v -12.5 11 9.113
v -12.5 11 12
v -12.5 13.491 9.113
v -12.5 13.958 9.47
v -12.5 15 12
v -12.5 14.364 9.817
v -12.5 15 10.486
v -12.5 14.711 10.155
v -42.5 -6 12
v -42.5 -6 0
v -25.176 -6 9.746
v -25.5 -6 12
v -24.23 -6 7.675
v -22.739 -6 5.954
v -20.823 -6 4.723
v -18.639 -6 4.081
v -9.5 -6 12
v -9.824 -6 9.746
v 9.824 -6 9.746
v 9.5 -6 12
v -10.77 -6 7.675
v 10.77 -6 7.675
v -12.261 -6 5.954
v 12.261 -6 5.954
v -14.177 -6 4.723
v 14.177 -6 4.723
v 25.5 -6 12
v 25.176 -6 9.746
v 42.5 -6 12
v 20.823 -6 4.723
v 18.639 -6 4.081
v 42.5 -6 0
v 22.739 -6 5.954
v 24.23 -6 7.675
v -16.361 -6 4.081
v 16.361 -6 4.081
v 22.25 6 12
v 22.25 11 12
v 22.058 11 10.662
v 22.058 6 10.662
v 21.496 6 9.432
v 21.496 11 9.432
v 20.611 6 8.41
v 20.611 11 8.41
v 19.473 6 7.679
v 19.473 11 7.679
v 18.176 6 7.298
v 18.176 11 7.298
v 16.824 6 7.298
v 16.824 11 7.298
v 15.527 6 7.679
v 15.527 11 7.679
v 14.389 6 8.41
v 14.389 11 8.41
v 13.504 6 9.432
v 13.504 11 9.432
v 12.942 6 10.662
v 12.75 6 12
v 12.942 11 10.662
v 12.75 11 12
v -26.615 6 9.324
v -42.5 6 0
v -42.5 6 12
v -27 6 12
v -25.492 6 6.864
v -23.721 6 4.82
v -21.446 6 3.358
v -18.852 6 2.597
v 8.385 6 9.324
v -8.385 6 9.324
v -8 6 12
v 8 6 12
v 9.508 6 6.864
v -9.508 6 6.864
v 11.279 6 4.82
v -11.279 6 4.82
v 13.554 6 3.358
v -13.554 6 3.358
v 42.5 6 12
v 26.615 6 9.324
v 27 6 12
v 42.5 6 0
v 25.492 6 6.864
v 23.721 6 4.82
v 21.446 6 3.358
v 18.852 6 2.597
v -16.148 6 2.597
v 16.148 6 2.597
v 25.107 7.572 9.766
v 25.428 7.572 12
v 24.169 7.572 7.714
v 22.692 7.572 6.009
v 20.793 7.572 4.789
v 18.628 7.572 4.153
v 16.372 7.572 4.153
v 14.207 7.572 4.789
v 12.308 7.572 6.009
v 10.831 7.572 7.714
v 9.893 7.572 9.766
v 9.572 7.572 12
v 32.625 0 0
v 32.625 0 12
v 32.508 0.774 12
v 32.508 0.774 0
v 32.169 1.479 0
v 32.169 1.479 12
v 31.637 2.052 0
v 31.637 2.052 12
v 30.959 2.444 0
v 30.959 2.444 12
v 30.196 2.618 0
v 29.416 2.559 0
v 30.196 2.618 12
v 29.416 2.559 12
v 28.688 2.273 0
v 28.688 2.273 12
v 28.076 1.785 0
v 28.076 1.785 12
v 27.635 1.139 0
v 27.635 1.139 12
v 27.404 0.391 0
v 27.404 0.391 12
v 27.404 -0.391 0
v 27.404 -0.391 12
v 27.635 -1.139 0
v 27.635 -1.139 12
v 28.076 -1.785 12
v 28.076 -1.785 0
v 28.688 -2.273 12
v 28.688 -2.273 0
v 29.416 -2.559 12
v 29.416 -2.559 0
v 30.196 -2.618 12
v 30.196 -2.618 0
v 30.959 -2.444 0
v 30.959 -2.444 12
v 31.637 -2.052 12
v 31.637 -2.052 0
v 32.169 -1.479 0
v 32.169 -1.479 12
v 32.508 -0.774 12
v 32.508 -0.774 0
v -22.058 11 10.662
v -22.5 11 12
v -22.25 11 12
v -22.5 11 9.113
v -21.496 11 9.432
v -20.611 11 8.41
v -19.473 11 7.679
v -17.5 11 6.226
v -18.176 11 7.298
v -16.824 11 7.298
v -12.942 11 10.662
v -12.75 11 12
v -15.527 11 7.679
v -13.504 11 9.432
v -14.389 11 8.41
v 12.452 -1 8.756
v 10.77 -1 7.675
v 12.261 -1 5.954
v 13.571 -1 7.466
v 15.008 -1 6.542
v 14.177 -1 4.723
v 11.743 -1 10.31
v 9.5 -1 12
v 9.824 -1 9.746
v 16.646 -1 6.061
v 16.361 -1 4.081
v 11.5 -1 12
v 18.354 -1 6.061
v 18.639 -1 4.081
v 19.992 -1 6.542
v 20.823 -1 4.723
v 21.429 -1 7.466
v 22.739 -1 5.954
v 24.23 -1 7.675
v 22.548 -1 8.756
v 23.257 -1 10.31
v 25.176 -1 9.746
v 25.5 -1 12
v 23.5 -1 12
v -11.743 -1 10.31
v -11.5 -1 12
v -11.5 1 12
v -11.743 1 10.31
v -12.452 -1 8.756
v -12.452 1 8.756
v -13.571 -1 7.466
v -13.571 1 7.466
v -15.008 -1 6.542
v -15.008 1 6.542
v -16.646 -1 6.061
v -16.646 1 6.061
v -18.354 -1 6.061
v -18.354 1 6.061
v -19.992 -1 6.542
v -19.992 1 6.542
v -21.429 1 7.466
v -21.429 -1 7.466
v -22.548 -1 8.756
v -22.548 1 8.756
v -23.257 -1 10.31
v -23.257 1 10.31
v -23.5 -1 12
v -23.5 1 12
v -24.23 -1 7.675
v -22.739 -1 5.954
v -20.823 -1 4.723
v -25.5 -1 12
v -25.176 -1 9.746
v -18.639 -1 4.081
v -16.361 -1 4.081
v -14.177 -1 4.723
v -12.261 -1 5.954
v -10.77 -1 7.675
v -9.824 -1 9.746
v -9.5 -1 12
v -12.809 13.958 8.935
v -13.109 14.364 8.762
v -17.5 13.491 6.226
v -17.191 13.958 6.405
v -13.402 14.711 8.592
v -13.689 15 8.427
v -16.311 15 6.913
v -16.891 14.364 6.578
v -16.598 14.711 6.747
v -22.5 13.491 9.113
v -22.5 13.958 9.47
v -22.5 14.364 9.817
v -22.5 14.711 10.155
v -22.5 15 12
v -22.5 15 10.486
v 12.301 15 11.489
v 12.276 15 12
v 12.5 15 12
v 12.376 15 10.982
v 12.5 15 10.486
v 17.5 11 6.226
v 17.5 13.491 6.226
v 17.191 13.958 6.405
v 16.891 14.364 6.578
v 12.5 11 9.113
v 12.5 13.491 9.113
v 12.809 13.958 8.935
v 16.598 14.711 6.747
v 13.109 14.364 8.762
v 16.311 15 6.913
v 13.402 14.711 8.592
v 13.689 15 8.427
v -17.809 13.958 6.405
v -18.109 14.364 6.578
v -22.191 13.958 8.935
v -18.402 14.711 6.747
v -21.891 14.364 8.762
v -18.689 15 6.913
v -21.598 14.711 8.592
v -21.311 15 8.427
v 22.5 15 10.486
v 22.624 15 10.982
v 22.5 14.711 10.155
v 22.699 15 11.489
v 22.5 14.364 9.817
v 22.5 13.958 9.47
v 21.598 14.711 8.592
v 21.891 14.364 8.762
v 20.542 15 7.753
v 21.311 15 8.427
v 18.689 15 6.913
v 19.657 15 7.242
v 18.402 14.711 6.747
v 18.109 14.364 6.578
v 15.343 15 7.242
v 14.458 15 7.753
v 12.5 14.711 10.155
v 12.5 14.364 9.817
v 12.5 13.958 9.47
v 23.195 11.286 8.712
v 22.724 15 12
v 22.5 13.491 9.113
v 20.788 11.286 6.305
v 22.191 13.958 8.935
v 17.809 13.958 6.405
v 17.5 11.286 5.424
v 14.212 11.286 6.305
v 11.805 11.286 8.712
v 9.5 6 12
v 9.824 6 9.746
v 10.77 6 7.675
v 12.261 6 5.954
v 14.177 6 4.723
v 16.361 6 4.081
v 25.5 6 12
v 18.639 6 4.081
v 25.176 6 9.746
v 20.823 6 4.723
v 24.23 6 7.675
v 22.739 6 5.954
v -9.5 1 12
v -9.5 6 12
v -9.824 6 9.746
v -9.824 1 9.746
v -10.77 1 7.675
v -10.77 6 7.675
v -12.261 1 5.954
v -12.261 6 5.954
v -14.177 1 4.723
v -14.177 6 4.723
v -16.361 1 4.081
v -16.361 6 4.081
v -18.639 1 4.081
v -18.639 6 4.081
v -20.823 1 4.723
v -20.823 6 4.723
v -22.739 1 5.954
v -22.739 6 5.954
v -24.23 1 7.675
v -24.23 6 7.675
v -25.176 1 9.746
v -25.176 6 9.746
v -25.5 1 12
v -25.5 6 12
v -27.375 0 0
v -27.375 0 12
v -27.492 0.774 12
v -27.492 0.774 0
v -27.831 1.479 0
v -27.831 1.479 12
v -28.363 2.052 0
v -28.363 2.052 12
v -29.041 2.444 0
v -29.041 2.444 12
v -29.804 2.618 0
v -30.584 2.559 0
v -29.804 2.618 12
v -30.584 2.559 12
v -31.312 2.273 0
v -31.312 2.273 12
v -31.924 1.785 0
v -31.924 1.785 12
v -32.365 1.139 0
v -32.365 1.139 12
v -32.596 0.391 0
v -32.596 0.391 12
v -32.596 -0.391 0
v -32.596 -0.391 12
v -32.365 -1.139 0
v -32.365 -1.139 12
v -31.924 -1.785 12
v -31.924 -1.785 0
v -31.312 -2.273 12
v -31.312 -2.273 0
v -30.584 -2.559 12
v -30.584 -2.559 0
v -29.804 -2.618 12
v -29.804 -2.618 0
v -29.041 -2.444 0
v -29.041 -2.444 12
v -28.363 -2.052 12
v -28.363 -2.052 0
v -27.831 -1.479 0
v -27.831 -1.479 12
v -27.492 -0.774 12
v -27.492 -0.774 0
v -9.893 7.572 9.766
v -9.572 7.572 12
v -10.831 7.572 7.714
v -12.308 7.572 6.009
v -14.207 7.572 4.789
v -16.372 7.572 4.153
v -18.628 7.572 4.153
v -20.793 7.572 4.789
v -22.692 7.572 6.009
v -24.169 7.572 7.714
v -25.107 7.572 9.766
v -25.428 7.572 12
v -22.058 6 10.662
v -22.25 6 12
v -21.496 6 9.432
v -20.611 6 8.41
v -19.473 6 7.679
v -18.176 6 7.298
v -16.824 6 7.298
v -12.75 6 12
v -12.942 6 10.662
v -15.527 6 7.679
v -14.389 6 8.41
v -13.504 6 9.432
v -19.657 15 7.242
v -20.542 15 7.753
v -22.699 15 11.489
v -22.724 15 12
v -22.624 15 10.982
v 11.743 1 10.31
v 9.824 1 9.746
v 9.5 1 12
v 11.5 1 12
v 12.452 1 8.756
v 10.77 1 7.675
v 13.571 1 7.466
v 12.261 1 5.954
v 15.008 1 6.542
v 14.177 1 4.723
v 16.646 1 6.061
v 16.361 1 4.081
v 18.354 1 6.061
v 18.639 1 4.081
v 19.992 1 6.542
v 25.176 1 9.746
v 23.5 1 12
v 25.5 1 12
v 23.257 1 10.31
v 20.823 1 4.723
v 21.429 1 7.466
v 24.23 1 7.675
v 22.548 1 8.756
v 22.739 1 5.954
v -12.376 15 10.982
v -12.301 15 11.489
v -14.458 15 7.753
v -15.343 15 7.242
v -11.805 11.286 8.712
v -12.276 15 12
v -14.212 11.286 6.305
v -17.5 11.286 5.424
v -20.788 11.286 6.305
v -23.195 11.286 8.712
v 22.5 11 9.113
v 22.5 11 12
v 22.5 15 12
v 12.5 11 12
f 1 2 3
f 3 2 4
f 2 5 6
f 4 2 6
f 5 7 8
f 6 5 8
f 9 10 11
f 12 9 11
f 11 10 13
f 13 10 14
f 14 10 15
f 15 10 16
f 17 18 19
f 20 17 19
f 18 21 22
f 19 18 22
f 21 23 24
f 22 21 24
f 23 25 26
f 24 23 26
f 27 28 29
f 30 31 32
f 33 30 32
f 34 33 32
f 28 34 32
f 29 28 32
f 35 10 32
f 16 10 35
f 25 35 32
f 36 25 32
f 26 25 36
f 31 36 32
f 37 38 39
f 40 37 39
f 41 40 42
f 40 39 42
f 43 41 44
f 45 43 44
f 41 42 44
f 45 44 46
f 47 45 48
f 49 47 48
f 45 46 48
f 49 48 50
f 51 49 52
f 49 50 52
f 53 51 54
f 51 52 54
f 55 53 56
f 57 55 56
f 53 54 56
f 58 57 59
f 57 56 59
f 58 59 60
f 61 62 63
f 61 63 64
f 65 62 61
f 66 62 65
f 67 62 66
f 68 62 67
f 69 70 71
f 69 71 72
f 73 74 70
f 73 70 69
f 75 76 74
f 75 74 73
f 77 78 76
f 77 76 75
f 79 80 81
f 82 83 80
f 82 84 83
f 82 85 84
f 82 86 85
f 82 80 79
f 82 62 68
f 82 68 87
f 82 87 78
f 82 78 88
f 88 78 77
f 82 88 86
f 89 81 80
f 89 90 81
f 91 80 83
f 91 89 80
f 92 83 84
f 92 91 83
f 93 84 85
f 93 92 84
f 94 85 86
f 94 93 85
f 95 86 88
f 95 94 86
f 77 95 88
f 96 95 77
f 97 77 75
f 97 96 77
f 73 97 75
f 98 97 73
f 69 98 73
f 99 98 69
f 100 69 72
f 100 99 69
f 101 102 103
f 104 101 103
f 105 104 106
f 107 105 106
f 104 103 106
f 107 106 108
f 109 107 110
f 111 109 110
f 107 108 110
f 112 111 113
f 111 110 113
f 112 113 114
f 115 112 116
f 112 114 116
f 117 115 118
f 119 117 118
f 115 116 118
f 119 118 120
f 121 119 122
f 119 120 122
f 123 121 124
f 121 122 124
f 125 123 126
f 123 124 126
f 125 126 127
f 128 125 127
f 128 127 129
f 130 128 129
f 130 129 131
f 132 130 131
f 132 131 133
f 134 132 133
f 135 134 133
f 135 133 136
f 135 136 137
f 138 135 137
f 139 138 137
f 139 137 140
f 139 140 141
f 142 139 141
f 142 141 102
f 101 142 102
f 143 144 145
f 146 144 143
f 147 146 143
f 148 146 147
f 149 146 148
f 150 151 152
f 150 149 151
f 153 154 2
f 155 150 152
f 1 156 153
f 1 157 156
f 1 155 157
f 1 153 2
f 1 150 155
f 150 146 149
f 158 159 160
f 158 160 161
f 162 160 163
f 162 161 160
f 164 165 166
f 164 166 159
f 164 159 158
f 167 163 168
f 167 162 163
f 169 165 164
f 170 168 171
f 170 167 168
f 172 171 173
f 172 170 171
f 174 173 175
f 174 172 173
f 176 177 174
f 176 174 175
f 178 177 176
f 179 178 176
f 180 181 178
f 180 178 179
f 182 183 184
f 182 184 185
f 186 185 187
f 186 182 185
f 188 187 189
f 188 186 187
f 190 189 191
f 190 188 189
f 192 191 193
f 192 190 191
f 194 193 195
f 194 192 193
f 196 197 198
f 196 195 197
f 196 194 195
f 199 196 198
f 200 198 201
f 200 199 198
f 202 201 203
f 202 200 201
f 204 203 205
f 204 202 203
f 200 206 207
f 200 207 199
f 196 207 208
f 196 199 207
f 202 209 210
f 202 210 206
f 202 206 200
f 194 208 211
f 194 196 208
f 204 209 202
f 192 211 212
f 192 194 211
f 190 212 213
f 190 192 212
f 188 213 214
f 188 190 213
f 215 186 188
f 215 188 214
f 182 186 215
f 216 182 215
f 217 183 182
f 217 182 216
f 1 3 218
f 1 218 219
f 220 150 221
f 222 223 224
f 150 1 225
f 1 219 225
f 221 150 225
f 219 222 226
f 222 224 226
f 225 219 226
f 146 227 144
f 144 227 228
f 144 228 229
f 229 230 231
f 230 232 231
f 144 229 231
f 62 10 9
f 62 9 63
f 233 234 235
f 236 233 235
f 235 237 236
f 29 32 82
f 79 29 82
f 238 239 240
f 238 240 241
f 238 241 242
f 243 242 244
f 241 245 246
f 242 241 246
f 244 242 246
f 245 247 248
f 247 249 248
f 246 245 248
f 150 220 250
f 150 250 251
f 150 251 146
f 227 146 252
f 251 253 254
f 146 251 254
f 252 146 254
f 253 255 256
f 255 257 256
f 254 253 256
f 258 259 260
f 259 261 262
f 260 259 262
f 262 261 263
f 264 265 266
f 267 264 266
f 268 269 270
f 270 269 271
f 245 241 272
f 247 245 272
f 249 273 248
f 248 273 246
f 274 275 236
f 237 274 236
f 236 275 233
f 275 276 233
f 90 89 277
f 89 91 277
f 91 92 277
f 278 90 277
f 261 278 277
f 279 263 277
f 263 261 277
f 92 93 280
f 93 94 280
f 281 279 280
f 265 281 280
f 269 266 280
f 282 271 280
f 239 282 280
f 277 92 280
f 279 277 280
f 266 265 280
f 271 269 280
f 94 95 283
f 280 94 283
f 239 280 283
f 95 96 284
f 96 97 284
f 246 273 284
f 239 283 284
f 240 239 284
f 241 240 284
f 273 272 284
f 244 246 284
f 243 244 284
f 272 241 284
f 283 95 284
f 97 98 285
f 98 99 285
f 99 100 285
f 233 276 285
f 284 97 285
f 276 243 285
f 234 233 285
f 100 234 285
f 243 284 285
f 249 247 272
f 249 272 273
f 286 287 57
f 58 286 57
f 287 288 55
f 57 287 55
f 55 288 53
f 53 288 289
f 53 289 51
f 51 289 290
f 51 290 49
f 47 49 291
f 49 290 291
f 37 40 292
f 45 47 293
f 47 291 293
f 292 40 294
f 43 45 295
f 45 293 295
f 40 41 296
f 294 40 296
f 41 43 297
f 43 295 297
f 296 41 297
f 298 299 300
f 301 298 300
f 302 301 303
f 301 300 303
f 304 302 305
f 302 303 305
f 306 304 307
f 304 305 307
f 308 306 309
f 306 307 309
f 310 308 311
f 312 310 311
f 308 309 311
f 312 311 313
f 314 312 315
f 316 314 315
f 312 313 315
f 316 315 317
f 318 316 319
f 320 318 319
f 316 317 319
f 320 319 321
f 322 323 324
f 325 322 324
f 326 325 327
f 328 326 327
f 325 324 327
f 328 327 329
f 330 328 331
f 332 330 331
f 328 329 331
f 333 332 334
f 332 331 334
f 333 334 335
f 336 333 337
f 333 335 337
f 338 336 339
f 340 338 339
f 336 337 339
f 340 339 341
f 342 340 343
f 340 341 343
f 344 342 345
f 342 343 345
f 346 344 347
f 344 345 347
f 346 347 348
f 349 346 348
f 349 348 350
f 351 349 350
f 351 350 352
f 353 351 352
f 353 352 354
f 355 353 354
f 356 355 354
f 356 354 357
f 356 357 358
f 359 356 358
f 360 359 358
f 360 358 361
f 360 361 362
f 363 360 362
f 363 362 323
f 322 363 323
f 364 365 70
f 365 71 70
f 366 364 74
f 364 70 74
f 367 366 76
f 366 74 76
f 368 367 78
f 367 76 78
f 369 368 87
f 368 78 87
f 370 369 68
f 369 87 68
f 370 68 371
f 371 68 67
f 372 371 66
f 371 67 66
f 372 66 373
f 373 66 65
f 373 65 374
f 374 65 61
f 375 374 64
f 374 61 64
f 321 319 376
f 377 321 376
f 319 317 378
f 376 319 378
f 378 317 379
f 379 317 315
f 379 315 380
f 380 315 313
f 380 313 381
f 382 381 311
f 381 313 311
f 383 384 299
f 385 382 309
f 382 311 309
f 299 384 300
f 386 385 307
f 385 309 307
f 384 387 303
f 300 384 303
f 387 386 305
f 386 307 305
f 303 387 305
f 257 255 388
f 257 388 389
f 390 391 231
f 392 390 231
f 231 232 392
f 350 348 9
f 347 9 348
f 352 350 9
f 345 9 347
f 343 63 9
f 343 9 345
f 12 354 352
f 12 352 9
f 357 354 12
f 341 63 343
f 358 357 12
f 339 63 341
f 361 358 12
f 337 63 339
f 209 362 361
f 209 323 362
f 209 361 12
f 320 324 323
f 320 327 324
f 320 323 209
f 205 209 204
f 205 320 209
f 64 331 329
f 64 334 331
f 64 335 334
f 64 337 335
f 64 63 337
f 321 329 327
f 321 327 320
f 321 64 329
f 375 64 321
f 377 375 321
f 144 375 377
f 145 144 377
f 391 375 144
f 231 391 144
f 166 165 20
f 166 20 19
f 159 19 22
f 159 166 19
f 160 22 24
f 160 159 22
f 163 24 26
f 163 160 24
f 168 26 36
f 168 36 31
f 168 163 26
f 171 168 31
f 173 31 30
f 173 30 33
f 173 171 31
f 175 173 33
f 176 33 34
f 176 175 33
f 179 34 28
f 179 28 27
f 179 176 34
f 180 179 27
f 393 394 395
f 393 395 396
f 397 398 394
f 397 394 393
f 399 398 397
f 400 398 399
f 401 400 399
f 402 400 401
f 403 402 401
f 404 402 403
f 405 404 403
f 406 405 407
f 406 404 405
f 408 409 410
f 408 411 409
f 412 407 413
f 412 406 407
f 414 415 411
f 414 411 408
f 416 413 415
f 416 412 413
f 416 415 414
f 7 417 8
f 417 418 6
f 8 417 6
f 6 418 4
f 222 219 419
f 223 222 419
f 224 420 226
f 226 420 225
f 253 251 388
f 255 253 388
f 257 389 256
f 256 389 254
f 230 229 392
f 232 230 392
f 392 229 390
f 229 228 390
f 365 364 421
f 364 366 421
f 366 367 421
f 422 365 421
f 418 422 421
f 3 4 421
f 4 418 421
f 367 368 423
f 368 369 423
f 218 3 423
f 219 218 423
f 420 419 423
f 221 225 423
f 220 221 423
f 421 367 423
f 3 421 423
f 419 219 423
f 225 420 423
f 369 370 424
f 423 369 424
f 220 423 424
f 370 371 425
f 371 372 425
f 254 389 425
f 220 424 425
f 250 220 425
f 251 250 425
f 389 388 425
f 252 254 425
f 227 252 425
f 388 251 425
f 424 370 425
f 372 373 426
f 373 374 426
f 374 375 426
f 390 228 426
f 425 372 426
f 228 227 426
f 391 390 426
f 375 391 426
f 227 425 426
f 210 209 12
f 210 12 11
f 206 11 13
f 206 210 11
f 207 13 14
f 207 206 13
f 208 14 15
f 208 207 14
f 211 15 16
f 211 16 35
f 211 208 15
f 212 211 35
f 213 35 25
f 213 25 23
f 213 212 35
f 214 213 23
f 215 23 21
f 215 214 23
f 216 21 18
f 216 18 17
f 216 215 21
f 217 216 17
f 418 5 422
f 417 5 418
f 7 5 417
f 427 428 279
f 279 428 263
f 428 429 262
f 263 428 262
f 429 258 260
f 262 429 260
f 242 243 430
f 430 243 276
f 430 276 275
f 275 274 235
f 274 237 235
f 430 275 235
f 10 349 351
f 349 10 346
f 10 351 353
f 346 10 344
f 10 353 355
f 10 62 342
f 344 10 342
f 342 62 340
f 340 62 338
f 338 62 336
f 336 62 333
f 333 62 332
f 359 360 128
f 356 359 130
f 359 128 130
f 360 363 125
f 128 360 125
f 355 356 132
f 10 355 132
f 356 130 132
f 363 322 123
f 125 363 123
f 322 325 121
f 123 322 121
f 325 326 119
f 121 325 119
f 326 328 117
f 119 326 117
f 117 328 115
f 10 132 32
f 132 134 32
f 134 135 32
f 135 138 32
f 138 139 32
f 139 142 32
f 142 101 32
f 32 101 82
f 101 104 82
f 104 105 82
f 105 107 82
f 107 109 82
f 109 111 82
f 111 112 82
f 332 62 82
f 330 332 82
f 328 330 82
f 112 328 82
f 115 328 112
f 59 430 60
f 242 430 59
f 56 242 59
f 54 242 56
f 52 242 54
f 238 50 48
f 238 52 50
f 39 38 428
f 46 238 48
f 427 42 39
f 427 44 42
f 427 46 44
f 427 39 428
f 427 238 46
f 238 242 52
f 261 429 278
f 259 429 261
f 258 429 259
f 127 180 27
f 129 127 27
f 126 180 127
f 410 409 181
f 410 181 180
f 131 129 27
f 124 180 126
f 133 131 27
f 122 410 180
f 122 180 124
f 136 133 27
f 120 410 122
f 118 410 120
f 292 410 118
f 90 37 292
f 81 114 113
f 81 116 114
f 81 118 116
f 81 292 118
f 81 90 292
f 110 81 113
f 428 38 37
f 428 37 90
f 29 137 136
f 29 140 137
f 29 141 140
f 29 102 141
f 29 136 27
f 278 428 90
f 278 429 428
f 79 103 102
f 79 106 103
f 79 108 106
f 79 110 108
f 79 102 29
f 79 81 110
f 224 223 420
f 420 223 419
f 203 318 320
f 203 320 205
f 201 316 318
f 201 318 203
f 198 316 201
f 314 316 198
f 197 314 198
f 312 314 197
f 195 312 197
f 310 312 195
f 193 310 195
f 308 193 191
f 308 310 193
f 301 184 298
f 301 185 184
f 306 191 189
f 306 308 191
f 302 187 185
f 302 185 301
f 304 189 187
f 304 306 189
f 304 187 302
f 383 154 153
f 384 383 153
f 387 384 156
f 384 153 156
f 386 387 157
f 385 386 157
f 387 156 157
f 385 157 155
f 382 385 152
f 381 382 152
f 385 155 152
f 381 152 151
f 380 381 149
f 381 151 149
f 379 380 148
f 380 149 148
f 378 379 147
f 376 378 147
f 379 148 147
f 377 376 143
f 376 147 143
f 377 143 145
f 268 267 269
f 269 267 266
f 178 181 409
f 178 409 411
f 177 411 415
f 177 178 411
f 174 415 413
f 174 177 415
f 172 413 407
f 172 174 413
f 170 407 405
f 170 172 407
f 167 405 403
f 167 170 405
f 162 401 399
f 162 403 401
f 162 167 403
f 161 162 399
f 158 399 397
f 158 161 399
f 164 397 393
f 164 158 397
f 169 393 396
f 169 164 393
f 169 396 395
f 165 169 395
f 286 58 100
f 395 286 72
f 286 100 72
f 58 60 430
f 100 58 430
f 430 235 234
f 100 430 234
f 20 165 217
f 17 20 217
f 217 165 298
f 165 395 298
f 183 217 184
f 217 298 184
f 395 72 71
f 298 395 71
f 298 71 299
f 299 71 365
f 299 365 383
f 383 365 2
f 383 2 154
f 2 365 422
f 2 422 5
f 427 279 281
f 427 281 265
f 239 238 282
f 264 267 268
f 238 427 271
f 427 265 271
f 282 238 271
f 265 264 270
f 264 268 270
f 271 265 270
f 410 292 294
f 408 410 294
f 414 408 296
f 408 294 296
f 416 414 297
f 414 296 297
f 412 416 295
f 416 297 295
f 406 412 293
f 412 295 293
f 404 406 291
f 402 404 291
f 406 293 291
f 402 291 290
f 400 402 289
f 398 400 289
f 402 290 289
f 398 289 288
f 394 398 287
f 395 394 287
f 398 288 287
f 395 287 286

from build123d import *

# Parameters (mm, degrees)
SKETCH1_W                     = 85
SKETCH1_H                     = 12
BOSS_EXTRUDE1_DEPTH           = 12
SKETCH2_R                     = 8
CUT_EXTRUDE2_DEPTH            = 5
CUT_EXTRUDE3_START            = -5
SKETCH3_R                     = 8
CUT_EXTRUDE3_DEPTH            = 5
CUT_EXTRUDE4_DEPTH            = 45.567364741
CUT_EXTRUDE4_DEPTH_BACK       = 45.567364741
SKETCH4_R                     = 6
SKETCH5_R                     = 2.625
CUT_EXTRUDE6_DEPTH            = 45.567364741
SKETCH7_R                     = 8.5
BOSS_EXTRUDE3_DEPTH           = 9
BOSS_EXTRUDE3_DRAFT           = 20
BOSS_EXTRUDE3_PROFILE_2_DEPTH = 9
BOSS_EXTRUDE3_PROFILE_2_DRAFT = 20
CHAMFER1_SIZE                 = 1.673157185
CHAMFER1_SIZE_2               = 1
CHAMFER2_SIZE                 = 1
CHAMFER2_SIZE_2               = 1.673157185
CUT_EXTRUDE9_DEPTH            = 4
SKETCH11_R                    = 4.75
CUT_EXTRUDE10_DEPTH           = 51.154760492
SKETCH12_W                    = 84.776225192
SKETCH12_H                    = 9.817436209
CUT_EXTRUDE11_DEPTH           = 52.647846034


with BuildPart() as part:
    # Sketch1 → Boss-Extrude1 (new body)
    with BuildSketch(Plane.XY):
        Rectangle(SKETCH1_W, SKETCH1_H)
    extrude(amount=BOSS_EXTRUDE1_DEPTH)

    # Sketch2 → Cut-Extrude2 (cut)
    with BuildSketch(Plane(origin=(0, 6, 0), x_dir=(1, 0, 0), z_dir=(0, 1, 0))):
        with Locations((-17.5, -12)):
            Circle(SKETCH2_R)
        with Locations((17.5, -12)):
            Circle(SKETCH2_R)
    extrude(amount=-CUT_EXTRUDE2_DEPTH, mode=Mode.SUBTRACT)

    # Sketch3 → Cut-Extrude3 (cut)
    with BuildSketch(Plane.XZ.offset(6).offset(CUT_EXTRUDE3_START)):
        with Locations((-17.5, 12)):
            Circle(SKETCH3_R)
        with Locations((17.5, 12)):
            Circle(SKETCH3_R)
    extrude(amount=CUT_EXTRUDE3_DEPTH, mode=Mode.SUBTRACT)

    # Sketch4 → Cut-Extrude4 (cut, two sides: drawn at the far end of the back side and taken through both)
    with BuildSketch(Plane(origin=(0, 0, 0), x_dir=(1, 0, 0), z_dir=(0, 1, 0)).offset(-CUT_EXTRUDE4_DEPTH_BACK)):
        with Locations((-17.5, -12)):
            Circle(SKETCH4_R)
        with Locations((17.5, -12)):
            Circle(SKETCH4_R)
    extrude(amount=CUT_EXTRUDE4_DEPTH + CUT_EXTRUDE4_DEPTH_BACK, mode=Mode.SUBTRACT)

    # Sketch5 → Cut-Extrude6 (cut, through all)
    with BuildSketch(Plane.XY.offset(12)):
        with Locations((-30, 0)):
            Circle(SKETCH5_R)
        with Locations((30, 0)):
            Circle(SKETCH5_R)
    extrude(amount=-CUT_EXTRUDE6_DEPTH, mode=Mode.SUBTRACT)


with BuildPart() as boss_extrude3_tool:
    # Sketch7 → Boss-Extrude3 (with draft: the straight prism first)
    with BuildSketch(Plane(origin=(0, 6, 0), x_dir=(1, 0, 0), z_dir=(0, 1, 0))):
        with Locations((-17.5, -12)):
            Circle(SKETCH7_R)
    extrude(amount=BOSS_EXTRUDE3_DEPTH)
    # Boss-Extrude3: the draft: its side faces are tilted about the plane it starts from
    boss_extrude3_sides = [boss_extrude3_tool.faces().sort_by_distance(p)[0] for p in [
        (-26, 10.5, 12),
    ]]
    draft(boss_extrude3_sides, Plane(origin=(0, 6, 0), x_dir=(1, 0, 0), z_dir=(0, 1, 0)), BOSS_EXTRUDE3_DRAFT)


with BuildPart() as part_1:
    add(part.part)

    # Boss-Extrude3: add boss_extrude3_tool
    add(boss_extrude3_tool.part)


with BuildPart() as boss_extrude3_profile_2_tool:
    # Sketch7 → Boss-Extrude3 profile 2 (with draft: the straight prism first)
    with BuildSketch(Plane(origin=(0, 6, 0), x_dir=(1, 0, 0), z_dir=(0, 1, 0))):
        with Locations((17.5, -12)):
            Circle(SKETCH7_R)
    extrude(amount=BOSS_EXTRUDE3_PROFILE_2_DEPTH)
    # Boss-Extrude3 profile 2: the draft: its side faces are tilted about the plane it starts from
    boss_extrude3_profile_2_sides = [boss_extrude3_profile_2_tool.faces().sort_by_distance(p)[0] for p in [
        (9, 10.5, 12),
    ]]
    draft(boss_extrude3_profile_2_sides, Plane(origin=(0, 6, 0), x_dir=(1, 0, 0), z_dir=(0, 1, 0)), BOSS_EXTRUDE3_PROFILE_2_DRAFT)


with BuildPart() as part_2:
    add(part_1.part)

    # Boss-Extrude3 profile 2: add boss_extrude3_profile_2_tool
    add(boss_extrude3_profile_2_tool.part)

    # Chamfer1
    # the kernel refuses this chamfer: 1.673157185, 1 mm, written as the material it adds along each edge
    with BuildSketch(Plane(origin=(-17.5, 6, 12), x_dir=(1, 0, 0), z_dir=(0, 0, 1))) as chamfer1_piece_1:
        Polygon((8.5 - CHAMFER1_SIZE * 0.342020143346, CHAMFER1_SIZE * 0.939692620843), (8.5 + CHAMFER1_SIZE_2, 0), (8.5, 0), align=None)
    revolve(axis=Axis((-17.5, 6, 12), (0, 1, 0)), revolution_arc=180)

    # Chamfer2
    # the kernel refuses this chamfer: 1.673157185, 1 mm, written as the material it adds along each edge
    with BuildSketch(Plane(origin=(17.5, 6, 12), x_dir=(1, 0, 0), z_dir=(0, 0, 1))) as chamfer2_piece_1:
        Polygon((8.5 + CHAMFER2_SIZE, 0), (8.5 - CHAMFER2_SIZE_2 * 0.342020143346, CHAMFER2_SIZE_2 * 0.939692620843), (8.5, 0), align=None)
    revolve(axis=Axis((17.5, 6, 12), (0, 1, 0)), revolution_arc=180)

    # Sketch10 → Cut-Extrude9 (cut)
    with BuildSketch(Plane(origin=(0, 15, 0), x_dir=(1, 0, 0), z_dir=(0, 1, 0))):
        Polygon((-17.5, -6.226497308), (-22.5, -9.113248654), (-22.5, -14.886751346), (-17.5, -17.773502692), (-12.5, -14.886751346), (-12.5, -9.113248654), align=None)
        Polygon((17.5, -6.226497308), (12.5, -9.113248654), (12.5, -14.886751346), (17.5, -17.773502692), (22.5, -14.886751346), (22.5, -9.113248654), align=None)
    extrude(amount=-CUT_EXTRUDE9_DEPTH, mode=Mode.SUBTRACT)

    # Sketch11 → Cut-Extrude10 (cut, through all)
    with BuildSketch(Plane(origin=(0, 11, 0), x_dir=(1, 0, 0), z_dir=(0, 1, 0))):
        with Locations((-17.5, -12)):
            Circle(SKETCH11_R)
        with Locations((17.5, -12)):
            Circle(SKETCH11_R)
    extrude(amount=-CUT_EXTRUDE10_DEPTH, mode=Mode.SUBTRACT)

    # Sketch12 → Cut-Extrude11 (cut, through all)
    with BuildSketch(Plane.XZ.offset(6)):
        with Locations((-0.111887404, 16.908718105)):
            Rectangle(SKETCH12_W, SKETCH12_H)
    extrude(amount=-CUT_EXTRUDE11_DEPTH, mode=Mode.SUBTRACT)


solid = part_2.part
